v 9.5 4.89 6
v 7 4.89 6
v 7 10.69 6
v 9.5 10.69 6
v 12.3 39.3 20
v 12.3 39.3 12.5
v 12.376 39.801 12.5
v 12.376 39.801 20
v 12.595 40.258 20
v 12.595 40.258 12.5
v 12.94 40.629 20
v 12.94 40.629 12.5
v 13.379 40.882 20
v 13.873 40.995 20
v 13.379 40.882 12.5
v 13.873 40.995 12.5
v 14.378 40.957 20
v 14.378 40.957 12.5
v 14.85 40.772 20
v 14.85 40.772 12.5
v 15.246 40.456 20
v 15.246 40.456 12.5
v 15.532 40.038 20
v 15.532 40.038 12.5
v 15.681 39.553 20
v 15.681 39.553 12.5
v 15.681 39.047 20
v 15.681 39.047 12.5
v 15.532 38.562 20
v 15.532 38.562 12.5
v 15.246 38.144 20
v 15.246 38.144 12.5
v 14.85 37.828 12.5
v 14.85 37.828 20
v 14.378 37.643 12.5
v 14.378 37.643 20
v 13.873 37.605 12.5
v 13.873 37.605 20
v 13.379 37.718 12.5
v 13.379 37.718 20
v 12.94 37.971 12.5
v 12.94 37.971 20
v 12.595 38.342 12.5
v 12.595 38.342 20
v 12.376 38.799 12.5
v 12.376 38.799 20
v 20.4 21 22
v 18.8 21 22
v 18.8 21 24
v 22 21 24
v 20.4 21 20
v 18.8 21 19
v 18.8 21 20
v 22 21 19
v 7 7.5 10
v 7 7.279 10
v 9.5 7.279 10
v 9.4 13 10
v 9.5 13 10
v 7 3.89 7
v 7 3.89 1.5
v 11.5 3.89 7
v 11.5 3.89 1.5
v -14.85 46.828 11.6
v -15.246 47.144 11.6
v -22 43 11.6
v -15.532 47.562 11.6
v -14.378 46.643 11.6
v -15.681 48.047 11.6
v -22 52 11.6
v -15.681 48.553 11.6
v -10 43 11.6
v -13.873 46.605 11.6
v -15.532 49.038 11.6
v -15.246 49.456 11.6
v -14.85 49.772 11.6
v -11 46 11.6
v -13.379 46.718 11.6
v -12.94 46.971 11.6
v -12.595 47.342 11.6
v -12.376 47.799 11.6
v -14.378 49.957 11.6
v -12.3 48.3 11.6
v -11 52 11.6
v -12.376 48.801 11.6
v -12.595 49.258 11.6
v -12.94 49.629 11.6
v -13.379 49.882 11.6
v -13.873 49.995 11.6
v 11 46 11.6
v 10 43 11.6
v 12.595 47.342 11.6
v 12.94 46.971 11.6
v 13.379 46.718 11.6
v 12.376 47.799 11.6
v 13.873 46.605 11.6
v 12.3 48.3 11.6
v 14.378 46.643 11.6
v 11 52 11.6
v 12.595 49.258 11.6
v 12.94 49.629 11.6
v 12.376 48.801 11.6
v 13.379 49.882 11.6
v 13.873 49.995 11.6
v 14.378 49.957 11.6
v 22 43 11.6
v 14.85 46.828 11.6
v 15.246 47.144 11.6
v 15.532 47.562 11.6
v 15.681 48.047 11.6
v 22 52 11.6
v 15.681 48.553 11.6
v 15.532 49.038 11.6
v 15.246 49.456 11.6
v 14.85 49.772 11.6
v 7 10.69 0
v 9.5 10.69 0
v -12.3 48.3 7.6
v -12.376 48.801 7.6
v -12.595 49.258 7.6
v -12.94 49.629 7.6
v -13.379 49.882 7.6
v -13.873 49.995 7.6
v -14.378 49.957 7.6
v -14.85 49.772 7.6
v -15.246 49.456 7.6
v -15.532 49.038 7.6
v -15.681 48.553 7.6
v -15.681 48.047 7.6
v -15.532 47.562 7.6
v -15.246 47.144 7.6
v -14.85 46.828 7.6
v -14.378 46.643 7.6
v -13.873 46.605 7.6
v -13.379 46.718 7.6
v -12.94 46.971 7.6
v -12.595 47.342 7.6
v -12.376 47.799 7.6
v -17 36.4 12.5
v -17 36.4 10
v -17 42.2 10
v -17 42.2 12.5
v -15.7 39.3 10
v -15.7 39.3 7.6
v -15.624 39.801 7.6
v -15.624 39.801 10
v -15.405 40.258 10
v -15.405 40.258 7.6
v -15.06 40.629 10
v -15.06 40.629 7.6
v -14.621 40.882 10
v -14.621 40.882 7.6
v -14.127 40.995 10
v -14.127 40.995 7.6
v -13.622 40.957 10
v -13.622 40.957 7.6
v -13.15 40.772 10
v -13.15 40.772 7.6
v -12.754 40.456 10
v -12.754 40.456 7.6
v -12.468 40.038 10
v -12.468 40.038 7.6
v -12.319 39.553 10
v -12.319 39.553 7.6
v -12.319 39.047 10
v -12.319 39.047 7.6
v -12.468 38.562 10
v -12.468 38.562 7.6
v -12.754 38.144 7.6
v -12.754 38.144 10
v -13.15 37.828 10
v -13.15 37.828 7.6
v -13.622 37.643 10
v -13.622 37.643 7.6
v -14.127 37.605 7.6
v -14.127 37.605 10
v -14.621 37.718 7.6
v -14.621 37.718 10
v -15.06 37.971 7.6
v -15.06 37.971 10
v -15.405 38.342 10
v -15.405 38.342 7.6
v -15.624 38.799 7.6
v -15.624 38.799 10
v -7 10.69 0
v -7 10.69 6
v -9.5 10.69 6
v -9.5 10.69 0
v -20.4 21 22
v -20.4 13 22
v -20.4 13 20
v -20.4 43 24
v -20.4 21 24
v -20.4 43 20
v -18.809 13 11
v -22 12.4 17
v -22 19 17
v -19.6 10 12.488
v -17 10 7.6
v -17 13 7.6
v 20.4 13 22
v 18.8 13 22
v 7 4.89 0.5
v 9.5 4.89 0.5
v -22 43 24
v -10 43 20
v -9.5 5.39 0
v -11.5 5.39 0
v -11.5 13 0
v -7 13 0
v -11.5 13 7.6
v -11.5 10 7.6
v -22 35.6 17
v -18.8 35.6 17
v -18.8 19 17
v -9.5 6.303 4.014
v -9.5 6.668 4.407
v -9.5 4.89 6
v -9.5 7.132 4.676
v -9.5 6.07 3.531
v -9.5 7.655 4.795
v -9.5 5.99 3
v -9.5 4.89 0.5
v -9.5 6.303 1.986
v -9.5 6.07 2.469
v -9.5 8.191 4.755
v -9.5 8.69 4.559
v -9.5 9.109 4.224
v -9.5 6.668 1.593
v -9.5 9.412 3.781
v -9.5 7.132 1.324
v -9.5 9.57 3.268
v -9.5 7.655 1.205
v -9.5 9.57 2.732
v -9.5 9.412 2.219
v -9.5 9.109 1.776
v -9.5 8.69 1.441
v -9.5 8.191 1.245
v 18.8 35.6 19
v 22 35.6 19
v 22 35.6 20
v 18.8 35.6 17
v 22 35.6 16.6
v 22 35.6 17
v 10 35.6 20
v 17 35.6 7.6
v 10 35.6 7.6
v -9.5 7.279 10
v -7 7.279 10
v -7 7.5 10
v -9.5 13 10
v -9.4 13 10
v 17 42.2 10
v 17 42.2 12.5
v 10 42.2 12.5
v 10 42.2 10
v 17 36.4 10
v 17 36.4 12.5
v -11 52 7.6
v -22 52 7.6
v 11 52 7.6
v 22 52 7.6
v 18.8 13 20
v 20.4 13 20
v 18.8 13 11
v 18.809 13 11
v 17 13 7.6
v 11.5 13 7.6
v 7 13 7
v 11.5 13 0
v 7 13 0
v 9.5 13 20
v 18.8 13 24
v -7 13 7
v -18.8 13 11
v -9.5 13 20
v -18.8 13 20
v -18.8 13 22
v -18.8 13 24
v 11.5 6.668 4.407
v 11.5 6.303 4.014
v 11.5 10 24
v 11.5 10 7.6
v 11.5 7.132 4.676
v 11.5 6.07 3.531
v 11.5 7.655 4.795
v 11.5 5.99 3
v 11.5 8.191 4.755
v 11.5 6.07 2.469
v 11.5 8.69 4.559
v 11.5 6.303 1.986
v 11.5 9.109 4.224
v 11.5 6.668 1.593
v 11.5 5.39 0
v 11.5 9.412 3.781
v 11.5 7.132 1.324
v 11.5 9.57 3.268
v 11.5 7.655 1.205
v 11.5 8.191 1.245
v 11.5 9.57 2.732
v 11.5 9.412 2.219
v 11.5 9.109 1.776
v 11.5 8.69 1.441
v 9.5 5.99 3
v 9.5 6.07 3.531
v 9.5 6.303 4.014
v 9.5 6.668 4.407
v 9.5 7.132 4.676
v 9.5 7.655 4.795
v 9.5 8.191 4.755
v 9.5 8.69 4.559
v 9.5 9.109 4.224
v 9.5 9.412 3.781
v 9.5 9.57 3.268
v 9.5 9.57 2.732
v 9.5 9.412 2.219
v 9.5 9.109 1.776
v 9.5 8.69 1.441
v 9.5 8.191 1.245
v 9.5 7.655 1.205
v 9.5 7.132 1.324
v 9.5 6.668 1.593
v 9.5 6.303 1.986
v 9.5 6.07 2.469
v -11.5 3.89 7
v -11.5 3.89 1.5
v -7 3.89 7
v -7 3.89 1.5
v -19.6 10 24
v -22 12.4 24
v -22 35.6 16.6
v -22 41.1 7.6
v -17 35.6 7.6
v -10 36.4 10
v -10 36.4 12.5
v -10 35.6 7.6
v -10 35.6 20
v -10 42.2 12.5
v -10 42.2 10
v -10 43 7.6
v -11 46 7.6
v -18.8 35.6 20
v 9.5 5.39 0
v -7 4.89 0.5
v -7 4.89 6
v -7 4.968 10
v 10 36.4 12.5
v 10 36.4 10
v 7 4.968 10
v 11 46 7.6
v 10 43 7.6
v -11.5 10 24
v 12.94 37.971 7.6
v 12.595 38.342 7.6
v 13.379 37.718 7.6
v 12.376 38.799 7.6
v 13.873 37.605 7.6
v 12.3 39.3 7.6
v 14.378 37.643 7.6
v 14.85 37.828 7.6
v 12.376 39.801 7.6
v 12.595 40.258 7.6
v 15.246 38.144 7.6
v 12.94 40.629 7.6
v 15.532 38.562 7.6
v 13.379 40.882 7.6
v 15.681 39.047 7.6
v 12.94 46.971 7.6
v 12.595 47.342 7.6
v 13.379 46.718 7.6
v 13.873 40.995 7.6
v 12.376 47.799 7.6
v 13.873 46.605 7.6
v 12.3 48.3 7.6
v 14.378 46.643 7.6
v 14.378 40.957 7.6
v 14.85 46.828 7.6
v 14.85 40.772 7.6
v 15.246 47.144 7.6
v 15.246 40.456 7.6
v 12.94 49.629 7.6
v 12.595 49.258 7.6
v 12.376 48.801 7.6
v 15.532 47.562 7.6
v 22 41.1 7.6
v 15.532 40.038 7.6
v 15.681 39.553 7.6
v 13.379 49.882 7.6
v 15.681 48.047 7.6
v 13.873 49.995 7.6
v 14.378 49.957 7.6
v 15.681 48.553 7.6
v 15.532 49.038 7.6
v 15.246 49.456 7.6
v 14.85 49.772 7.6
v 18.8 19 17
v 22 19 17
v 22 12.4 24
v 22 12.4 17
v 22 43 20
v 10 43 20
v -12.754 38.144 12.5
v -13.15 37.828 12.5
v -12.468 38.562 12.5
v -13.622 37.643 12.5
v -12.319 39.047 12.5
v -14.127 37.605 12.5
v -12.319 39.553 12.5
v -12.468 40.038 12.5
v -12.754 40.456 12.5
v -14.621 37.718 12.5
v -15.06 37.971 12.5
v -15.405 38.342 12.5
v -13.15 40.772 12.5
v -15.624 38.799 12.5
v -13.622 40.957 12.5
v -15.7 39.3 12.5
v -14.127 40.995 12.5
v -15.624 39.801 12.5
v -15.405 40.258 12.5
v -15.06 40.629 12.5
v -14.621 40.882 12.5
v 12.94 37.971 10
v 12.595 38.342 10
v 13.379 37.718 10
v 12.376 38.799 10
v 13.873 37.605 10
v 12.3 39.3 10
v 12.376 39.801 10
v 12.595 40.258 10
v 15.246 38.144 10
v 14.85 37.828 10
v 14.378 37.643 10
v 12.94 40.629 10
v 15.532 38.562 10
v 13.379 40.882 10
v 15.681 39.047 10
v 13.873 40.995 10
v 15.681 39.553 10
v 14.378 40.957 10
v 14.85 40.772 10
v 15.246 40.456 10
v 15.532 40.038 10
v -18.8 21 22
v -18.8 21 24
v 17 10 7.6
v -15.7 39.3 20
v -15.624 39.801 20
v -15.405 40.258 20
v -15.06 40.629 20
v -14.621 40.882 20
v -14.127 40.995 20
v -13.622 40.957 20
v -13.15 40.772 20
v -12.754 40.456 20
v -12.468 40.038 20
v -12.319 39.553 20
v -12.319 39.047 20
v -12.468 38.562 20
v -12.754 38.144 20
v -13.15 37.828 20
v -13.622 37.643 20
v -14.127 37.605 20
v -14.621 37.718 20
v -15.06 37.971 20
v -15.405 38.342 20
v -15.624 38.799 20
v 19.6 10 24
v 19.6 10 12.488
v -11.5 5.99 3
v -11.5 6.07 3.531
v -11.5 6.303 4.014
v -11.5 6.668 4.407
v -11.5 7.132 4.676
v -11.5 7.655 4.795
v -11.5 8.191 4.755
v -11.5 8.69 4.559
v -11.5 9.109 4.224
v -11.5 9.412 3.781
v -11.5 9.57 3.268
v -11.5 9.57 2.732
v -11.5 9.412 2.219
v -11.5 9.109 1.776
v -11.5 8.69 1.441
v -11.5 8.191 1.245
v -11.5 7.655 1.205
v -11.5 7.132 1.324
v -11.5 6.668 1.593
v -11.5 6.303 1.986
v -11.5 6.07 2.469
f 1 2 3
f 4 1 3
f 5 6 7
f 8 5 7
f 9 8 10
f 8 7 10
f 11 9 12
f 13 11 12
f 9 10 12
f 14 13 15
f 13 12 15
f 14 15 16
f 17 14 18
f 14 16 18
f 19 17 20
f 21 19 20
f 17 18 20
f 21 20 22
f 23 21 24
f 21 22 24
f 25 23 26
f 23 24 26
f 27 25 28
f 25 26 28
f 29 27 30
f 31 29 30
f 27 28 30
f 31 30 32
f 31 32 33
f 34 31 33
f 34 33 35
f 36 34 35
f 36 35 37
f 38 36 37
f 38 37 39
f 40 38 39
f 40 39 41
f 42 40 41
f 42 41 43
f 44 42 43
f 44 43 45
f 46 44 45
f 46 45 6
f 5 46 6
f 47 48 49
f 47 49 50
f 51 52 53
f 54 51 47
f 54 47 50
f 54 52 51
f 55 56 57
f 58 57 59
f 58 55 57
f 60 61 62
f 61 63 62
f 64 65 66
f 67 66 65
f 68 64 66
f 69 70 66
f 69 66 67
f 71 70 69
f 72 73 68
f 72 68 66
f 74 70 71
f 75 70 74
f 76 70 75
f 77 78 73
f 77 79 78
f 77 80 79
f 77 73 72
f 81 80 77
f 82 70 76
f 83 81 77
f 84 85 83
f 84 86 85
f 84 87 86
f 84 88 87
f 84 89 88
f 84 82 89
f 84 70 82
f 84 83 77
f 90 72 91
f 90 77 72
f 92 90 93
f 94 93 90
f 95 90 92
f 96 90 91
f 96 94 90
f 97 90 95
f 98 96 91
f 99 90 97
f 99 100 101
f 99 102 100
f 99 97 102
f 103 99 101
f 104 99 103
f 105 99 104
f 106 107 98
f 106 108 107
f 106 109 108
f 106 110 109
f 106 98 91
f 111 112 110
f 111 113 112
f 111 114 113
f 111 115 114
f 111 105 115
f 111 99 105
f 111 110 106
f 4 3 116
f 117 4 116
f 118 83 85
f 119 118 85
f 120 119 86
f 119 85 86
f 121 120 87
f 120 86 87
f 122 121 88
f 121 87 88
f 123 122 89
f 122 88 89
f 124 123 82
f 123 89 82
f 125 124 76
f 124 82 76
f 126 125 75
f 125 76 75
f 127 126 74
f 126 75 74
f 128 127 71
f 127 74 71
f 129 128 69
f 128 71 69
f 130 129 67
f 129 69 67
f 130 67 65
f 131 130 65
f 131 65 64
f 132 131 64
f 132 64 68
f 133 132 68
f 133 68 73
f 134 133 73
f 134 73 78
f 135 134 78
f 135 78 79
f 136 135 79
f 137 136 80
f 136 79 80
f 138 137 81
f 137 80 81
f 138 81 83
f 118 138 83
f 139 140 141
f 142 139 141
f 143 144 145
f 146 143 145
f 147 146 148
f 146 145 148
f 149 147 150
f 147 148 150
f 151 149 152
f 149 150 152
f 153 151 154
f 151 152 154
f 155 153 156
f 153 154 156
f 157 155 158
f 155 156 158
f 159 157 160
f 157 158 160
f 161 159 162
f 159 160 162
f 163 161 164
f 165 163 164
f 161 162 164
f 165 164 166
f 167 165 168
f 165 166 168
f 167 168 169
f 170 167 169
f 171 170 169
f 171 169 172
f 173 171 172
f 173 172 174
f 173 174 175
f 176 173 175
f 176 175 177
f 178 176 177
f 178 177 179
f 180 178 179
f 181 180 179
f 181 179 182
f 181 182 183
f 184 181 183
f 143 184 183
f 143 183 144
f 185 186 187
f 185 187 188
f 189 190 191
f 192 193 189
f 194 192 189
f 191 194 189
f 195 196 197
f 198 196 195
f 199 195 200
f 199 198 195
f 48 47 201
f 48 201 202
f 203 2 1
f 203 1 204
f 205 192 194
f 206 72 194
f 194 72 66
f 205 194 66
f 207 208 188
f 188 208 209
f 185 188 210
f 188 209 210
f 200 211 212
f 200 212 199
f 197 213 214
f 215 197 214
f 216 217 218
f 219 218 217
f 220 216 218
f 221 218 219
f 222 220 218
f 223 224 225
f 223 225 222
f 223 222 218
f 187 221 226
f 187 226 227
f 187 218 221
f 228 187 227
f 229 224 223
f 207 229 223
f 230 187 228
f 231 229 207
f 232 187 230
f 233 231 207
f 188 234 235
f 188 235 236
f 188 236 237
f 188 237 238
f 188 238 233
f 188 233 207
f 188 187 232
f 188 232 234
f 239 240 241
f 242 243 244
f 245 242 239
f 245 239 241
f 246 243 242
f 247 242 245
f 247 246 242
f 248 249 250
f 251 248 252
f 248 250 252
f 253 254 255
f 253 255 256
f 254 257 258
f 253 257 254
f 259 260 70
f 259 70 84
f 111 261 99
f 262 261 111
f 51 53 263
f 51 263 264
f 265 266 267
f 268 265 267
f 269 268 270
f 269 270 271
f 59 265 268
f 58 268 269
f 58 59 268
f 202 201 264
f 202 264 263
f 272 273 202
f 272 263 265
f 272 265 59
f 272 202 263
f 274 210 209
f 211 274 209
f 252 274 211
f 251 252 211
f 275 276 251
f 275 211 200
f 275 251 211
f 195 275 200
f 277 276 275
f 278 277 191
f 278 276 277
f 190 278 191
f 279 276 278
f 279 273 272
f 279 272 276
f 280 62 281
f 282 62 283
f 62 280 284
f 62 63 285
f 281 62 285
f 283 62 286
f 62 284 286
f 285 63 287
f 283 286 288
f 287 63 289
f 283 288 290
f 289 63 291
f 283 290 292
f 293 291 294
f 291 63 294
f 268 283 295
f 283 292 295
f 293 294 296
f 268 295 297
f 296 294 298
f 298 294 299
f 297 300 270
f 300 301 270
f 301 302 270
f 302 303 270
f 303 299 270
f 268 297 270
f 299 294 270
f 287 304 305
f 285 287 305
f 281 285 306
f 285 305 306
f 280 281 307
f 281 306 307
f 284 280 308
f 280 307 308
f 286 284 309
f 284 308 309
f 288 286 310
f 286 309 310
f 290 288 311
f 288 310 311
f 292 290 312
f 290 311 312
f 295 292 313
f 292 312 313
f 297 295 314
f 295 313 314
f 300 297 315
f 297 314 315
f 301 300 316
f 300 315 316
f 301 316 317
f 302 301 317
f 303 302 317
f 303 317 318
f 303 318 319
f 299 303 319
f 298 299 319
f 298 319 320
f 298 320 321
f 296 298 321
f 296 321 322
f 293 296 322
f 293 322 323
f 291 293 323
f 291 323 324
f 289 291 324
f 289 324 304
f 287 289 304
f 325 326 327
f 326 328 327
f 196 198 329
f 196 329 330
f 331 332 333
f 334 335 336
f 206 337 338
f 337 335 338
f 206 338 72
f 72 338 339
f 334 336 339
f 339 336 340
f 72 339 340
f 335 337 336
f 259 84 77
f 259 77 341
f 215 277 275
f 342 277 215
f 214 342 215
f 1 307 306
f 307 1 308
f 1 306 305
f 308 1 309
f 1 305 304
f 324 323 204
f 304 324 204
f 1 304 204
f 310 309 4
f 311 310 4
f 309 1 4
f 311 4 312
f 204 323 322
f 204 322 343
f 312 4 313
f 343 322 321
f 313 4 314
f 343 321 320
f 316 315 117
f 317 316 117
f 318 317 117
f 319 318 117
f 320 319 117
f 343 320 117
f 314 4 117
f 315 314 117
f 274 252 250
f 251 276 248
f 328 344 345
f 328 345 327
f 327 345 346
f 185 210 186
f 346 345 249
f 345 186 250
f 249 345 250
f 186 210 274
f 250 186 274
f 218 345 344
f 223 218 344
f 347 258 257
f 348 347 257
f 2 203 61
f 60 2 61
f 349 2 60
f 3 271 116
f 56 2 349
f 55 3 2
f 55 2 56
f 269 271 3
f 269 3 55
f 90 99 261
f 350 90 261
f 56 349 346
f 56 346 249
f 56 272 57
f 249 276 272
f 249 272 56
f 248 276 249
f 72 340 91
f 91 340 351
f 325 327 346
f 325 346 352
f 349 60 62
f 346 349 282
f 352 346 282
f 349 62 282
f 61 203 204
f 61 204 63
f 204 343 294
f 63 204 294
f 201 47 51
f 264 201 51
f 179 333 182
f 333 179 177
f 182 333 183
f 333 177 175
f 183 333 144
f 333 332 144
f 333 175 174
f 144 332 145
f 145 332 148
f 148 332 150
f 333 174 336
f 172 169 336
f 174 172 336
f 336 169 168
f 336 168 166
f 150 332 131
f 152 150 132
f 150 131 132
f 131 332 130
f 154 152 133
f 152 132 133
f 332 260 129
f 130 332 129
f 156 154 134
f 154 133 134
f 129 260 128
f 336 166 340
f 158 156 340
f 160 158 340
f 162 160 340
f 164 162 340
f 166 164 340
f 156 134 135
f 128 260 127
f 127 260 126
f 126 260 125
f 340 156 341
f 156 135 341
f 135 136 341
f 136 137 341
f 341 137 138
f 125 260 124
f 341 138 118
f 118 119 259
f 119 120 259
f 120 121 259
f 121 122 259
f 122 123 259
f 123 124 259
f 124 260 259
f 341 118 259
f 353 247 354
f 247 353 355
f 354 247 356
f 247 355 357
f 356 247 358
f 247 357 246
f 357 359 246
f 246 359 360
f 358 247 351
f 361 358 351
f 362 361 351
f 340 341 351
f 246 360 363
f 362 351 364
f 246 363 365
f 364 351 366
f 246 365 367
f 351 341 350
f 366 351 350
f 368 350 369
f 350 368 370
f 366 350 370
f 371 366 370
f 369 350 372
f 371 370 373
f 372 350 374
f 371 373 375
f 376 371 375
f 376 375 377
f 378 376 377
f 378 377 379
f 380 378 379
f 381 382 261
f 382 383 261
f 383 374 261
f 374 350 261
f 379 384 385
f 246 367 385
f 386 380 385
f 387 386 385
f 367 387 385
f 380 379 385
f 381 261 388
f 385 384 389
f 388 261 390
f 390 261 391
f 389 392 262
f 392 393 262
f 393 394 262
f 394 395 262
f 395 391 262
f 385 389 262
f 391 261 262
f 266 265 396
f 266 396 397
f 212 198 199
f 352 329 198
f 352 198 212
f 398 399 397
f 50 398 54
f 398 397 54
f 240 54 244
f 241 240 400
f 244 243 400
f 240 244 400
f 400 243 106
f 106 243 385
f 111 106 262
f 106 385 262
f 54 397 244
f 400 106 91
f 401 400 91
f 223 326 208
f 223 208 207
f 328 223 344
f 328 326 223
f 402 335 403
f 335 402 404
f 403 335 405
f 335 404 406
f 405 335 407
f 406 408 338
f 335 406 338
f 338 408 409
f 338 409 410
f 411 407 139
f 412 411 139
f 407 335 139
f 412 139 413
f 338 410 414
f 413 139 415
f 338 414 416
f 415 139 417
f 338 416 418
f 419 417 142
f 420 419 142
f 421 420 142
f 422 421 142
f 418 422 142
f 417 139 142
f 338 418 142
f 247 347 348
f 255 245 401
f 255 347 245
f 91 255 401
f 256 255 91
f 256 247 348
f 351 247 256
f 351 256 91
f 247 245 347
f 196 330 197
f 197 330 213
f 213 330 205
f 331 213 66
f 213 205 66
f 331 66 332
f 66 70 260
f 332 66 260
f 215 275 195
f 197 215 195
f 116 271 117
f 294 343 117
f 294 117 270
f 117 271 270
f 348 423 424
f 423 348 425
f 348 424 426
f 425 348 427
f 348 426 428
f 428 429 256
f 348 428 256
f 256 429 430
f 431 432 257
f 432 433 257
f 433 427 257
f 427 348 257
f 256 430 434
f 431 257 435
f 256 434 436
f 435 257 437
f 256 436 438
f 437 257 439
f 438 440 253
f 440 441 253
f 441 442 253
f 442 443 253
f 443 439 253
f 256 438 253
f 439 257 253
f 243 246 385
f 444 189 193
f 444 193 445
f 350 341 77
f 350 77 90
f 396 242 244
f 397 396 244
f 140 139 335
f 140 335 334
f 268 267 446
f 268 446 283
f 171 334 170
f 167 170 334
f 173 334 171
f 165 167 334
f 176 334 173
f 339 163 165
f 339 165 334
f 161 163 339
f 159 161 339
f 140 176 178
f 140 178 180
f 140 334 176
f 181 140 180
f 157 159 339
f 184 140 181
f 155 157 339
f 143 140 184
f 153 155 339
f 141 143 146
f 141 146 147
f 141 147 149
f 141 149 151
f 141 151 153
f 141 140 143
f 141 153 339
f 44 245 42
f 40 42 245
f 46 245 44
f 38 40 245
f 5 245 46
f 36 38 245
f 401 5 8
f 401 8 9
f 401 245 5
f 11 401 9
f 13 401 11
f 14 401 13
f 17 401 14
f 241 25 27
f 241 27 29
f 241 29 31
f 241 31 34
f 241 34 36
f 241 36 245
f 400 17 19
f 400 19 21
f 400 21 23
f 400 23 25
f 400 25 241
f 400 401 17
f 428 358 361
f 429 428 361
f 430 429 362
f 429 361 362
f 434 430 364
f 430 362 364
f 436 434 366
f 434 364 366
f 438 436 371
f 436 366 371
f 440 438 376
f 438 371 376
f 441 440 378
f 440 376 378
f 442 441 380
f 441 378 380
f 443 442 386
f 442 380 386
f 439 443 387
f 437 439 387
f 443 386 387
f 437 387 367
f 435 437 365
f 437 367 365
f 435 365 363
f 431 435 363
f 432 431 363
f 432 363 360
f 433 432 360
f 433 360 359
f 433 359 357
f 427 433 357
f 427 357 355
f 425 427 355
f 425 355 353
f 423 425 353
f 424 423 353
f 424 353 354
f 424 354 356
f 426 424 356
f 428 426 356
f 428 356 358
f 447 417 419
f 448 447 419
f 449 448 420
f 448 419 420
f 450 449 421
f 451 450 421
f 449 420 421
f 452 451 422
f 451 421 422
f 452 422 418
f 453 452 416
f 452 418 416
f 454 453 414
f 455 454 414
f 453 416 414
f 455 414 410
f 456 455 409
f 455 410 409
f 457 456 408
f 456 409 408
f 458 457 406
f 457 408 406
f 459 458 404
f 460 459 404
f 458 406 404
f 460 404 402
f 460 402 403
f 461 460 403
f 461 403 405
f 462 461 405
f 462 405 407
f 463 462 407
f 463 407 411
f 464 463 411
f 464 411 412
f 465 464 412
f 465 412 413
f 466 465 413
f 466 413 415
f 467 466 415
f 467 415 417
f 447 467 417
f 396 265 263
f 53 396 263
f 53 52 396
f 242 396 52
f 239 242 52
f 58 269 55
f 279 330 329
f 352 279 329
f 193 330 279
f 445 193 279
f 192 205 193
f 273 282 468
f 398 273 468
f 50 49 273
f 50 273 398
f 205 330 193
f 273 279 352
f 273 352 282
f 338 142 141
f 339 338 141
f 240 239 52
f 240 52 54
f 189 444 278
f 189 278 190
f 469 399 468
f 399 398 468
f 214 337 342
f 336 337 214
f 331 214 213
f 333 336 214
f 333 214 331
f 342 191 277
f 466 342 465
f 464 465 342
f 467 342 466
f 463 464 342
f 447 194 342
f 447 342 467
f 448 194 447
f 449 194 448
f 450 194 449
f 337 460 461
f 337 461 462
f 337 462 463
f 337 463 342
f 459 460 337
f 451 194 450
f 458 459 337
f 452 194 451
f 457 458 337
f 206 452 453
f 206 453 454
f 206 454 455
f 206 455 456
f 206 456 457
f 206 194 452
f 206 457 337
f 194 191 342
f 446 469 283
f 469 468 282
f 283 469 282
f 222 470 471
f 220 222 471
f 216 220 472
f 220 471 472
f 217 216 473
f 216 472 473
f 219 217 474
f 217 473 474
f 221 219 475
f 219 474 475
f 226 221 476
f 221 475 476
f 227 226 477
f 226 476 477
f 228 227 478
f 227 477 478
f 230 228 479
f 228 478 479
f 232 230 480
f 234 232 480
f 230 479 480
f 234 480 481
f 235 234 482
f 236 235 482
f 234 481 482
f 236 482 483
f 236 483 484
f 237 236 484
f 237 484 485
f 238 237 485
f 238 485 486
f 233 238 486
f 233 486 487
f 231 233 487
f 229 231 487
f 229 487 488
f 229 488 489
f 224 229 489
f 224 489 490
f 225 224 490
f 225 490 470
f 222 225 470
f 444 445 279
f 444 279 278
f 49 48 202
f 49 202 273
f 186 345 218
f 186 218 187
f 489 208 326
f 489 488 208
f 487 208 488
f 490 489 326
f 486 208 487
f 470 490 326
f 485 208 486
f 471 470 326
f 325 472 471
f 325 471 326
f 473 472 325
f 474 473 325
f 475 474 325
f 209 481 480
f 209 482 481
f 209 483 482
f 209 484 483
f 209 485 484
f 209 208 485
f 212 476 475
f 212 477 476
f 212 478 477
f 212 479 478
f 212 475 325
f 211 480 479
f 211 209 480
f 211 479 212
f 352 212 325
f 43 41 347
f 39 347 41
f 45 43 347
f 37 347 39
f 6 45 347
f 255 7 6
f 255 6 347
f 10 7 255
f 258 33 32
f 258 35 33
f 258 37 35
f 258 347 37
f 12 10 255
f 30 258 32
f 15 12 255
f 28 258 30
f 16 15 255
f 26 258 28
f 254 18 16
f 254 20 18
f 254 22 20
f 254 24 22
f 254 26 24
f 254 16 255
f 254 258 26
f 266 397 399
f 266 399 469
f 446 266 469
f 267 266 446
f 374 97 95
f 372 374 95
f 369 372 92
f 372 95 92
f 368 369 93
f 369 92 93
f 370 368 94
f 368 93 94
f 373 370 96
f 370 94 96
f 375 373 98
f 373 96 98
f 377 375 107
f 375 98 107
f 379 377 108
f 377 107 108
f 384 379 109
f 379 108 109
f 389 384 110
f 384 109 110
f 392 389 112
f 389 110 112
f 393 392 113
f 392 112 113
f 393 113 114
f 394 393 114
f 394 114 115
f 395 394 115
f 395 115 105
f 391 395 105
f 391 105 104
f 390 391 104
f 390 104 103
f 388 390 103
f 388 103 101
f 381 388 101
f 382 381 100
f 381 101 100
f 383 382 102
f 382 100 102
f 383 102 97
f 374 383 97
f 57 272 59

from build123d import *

# Parameters (mm, degrees)
SKETCH_1_W                = 44
SKETCH_1_H                = 34
EXTRUDE_1_DEPTH           = 24
CUT_EXTRUDE_1_DEPTH       = 31
SKETCH_5_W                = 23
SKETCH_5_H                = 6.11
EXTRUDE_4_DEPTH           = 1
EXTRUDE_5_DEPTH           = 23
SKETCH_7_R                = 1.8
CUT_EXTRUDE_2_DEPTH       = 23
CUT_EXTRUDE_4_DEPTH       = 14
SKETCH_11_R               = 1.7
EXTRUDE_6_DEPTH           = 20
CUT_EXTRUDE_7_DEPTH       = 4
CHAMFER_3_SIZE            = 2.4
SKETCH_14_W               = 40.8
SKETCH_14_H               = 4
CUT_EXTRUDE_8_DEPTH       = 23
SKETCH_15_W               = 44
SKETCH_15_H               = 1
CUT_EXTRUDE_9_DEPTH       = 24
SKETCH_16_W               = 3.2
SKETCH_16_H               = 14.6
CUT_EXTRUDE_10_DEPTH      = 5
CUT_EXTRUDE_12_DEPTH      = 10
CUT_EXTRUDE_12_DEPTH_BACK = 17
SKETCH_19_W               = 1
SKETCH_19_H               = 6.11
CUT_EXTRUDE_13_DEPTH      = 23
CHAMFER_4_SIZE            = 1.5
SKETCH_22_W               = 34
SKETCH_22_H               = 7.4
SKETCH_22_W_2             = 5.5
SKETCH_22_H_2             = 3
CUT_EXTRUDE_14_DEPTH      = 7.6
SKETCH_23_W               = 6
SKETCH_23_H               = 5.8
CUT_EXTRUDE_15_DEPTH      = 2.5
SKETCH_25_W               = 2.5
SKETCH_25_H               = 5.8
CUT_EXTRUDE_17_DEPTH      = 7
SKETCH_26_W               = 34
SKETCH_26_H               = 4
EXTRUDE_7_DEPTH           = 9
SKETCH_27_W               = 22
SKETCH_27_H               = 4.9
CUT_EXTRUDE_18_DEPTH      = 6
SKETCH_28_R               = 1.7
CUT_EXTRUDE_19_DEPTH      = 4
CHAMFER_5_SIZE            = 5
CHAMFER_5_SIZE_2          = 9.4
CHAMFER_6_SIZE            = 5
CHAMFER_6_SIZE_2          = 9.4
SKETCH_30_W               = 5
SKETCH_30_H               = 7.4
EXTRUDE_8_DEPTH           = 9.4
SKETCH_32_W               = 5
SKETCH_32_H               = 4
EXTRUDE_9_DEPTH           = 9
SKETCH_33_W               = 1.6
SKETCH_33_H               = 4
CUT_EXTRUDE_20_DEPTH      = 7.4
CHAMFER_START             = 3.158134344
CHAMFER_7_DEPTH           = 2.841865656
CHAMFER_START_2           = -6
CHAMFER_8_DEPTH           = 2.841865656
CHAMFER_START_3           = 9
CHAMFER_9_DEPTH           = 4.404008624
CHAMFER_START_4           = -13.404008624
CHAMFER_10_DEPTH          = 14.281940081
CHAMFER_11_SIZE           = 6
CHAMFER_12_SIZE           = 6


with BuildPart() as part:
    # Эскиз1 → Бобышка-Вытянуть1 (new body)
    with BuildSketch(Plane.XY):
        with Locations((0, 27)):
            Rectangle(SKETCH_1_W, SKETCH_1_H)
    extrude(amount=EXTRUDE_1_DEPTH)

    # Эскиз2 → Вырез-Вытянуть1 (cut)
    with BuildSketch(Plane(origin=(0, 44, 0), x_dir=(1, 0, 0), z_dir=(0, 1, 0))):
        Polygon((-18.8, 0), (18.8, 0), (18.8, -20), (20.4, -20), (20.4, -22), (18.8, -22), (18.8, -24), (-18.8, -24), (-18.8, -22), (-20.4, -22), (-20.4, -20), (-18.8, -20), align=None)
    extrude(amount=-CUT_EXTRUDE_1_DEPTH, mode=Mode.SUBTRACT)



with BuildPart() as body_2:
    # Эскиз5 → Бобышка-Вытянуть4 (new body)
    with BuildSketch(Plane(origin=(0, 0, 0), x_dir=(-1, 0, 0), z_dir=(0, 0, -1))):
        with Locations((0, 6.945)):
            Rectangle(SKETCH_5_W, SKETCH_5_H)
    extrude(amount=EXTRUDE_4_DEPTH)


with BuildPart() as part_1:
    add(part.part)

    add(body_2.part)  # Бобышка-Вытянуть5 merges body 2
    # Эскиз6 → Бобышка-Вытянуть5 (add)
    with BuildSketch(Plane(origin=(11.5, 0, 0), x_dir=(0, 0, -1), z_dir=(1, 0, 0))):
        Polygon((0, 3.89), (-7, 3.89), (-24, 10), (0, 10), align=None)
    extrude(amount=-EXTRUDE_5_DEPTH)

    # Эскиз7 → Вырез-Вытянуть2 (cut)
    with BuildSketch(Plane.ZY.offset(11.5)):
        with Locations(Location((3, 7.79, 0), (0, 0, 270))):
            Circle(SKETCH_7_R)
    extrude(amount=-CUT_EXTRUDE_2_DEPTH, mode=Mode.SUBTRACT)

    # Эскиз8 → Вырез-Вытянуть4 (cut)
    with BuildSketch(Plane.ZY.offset(7)):
        Polygon((20, 13), (-1, 13), (-1, 3.89), (10, 3.89), (10, 7.278569391), align=None)
    extrude(amount=-CUT_EXTRUDE_4_DEPTH, mode=Mode.SUBTRACT)

    # Эскиз11 → Бобышка-Вытянуть6 (add)
    # profile 1 of 2: a face of its own
    with BuildSketch(Plane(origin=(0, 0, 0), x_dir=(-1, 0, 0), z_dir=(0, 0, -1))):
        Polygon((-14, 43), (-18.8, 43), (-18.8, 35.6), (-14, 35.6), (-10, 35.6), (-10, 43), align=None)
        with Locations((-14, 39.3)):
            Circle(SKETCH_11_R, mode=Mode.SUBTRACT)
    # profile 2 of 2: a face of its own
    with BuildSketch(Plane(origin=(0, 0, 0), x_dir=(-1, 0, 0), z_dir=(0, 0, -1))):
        Polygon((18.8, 35.6), (14, 35.6), (10, 35.6), (10, 43), (14, 43), (18.8, 43), align=None)
        with Locations((14, 39.3)):
            Circle(SKETCH_11_R, mode=Mode.SUBTRACT)
    extrude(amount=-EXTRUDE_6_DEPTH)

    # Эскиз13 → Вырез-Вытянуть7 (cut)
    with BuildSketch(Plane.ZY.offset(22)):
        Polygon((9, 34), (17, 36), (17, 33.5), (9, 31.5), align=None)
        Polygon((9, 30.5), (17, 32.5), (17, 30), (9, 28), align=None)
        Polygon((9, 27), (17, 29), (17, 26.5), (9, 24.5), align=None)
        Polygon((9, 23.5), (17, 25.5), (17, 23), (9, 21), align=None)
        Polygon((9, 20), (17, 22), (17, 19.5), (9, 17.5), align=None)
    cut_extrude_7 = extrude(amount=-CUT_EXTRUDE_7_DEPTH, mode=Mode.SUBTRACT)

    # Зеркальное отражение1: Вырез-Вытянуть7 across plane
    add(cut_extrude_7.mirror(Plane(origin=(0, 0, 0), x_dir=(0, 0, 1), z_dir=(1, 0, 0))), mode=Mode.SUBTRACT)

    # Фаска3
    chamfer_3_edges = [part_1.edges().sort_by_distance(p)[0] for p in [
        (22, 10, 12),
        (-22, 10, 12),
    ]]
    chamfer(chamfer_3_edges, length=CHAMFER_3_SIZE)

    # Эскиз14 → Вырез-Вытянуть8 (cut)
    with BuildSketch(Plane(origin=(0, 44, 0), x_dir=(1, 0, 0), z_dir=(0, 1, 0))):
        with Locations((0, -22)):
            Rectangle(SKETCH_14_W, SKETCH_14_H)
    extrude(amount=-CUT_EXTRUDE_8_DEPTH, mode=Mode.SUBTRACT)

    # Эскиз15 → Вырез-Вытянуть9 (cut)
    with BuildSketch(Plane(origin=(0, 0, 0), x_dir=(-1, 0, 0), z_dir=(0, 0, -1))):
        with Locations((0, 43.5)):
            Rectangle(SKETCH_15_W, SKETCH_15_H)
    extrude(amount=-CUT_EXTRUDE_9_DEPTH, mode=Mode.SUBTRACT)

    # Эскиз16 → Вырез-Вытянуть10 (cut)
    with BuildSketch(Plane.XY.offset(24)):
        with Locations((20.4, 28.3)):
            Rectangle(SKETCH_16_W, SKETCH_16_H)
    extrude(amount=-CUT_EXTRUDE_10_DEPTH, mode=Mode.SUBTRACT)

    # Эскиз18 → Вырез-Вытянуть12 (cut, two sides: drawn at the far end of the back side and taken through both)
    with BuildSketch(Plane(origin=(0, 0, 0), x_dir=(-1, 0, 0), z_dir=(0, 0, -1)).offset(-CUT_EXTRUDE_12_DEPTH_BACK)):
        Polygon((-22, 43), (-17, 43), (-17, 10), (-19.6, 10), (-22, 12.4), align=None)
        Polygon((22, 12.4), (19.6, 10), (17, 10), (17, 43), (22, 43), align=None)
    extrude(amount=CUT_EXTRUDE_12_DEPTH + CUT_EXTRUDE_12_DEPTH_BACK, mode=Mode.SUBTRACT)

    # Эскиз19 → Вырез-Вытянуть13 (cut)
    with BuildSketch(Plane.ZY.offset(11.5)):
        with Locations((-0.5, 6.945)):
            Rectangle(SKETCH_19_W, SKETCH_19_H)
    extrude(amount=-CUT_EXTRUDE_13_DEPTH, mode=Mode.SUBTRACT)

    # Фаска4
    chamfer_4_edges = [part_1.edges().sort_by_distance(p)[0] for p in [
        (-9.25, 3.89, 0),
        (9.25, 3.89, 0),
    ]]
    chamfer(chamfer_4_edges, length=CHAMFER_4_SIZE)

    # Эскиз22 → Вырез-Вытянуть14 (cut)
    with BuildSketch(Plane(origin=(0, 0, 0), x_dir=(-1, 0, 0), z_dir=(0, 0, -1))):
        with Locations((0, 39.3)):
            Rectangle(SKETCH_22_W, SKETCH_22_H)
        with Locations((-14.25, 11.5)):
            Rectangle(SKETCH_22_W_2, SKETCH_22_H_2)
        with Locations((14.25, 11.5)):
            Rectangle(SKETCH_22_W_2, SKETCH_22_H_2)
    extrude(amount=-CUT_EXTRUDE_14_DEPTH, mode=Mode.SUBTRACT)

    # Эскиз23 → Вырез-Вытянуть15 (cut)
    with BuildSketch(Plane(origin=(-7, 0, 0), x_dir=(0, 0, -1), z_dir=(1, 0, 0))):
        with Locations((-3, 7.79)):
            Rectangle(SKETCH_23_W, SKETCH_23_H)
        Polygon((-20, 13), (-10, 7.278569391), (-10, 13), align=None)
    cut_extrude_15 = extrude(amount=-CUT_EXTRUDE_15_DEPTH, mode=Mode.SUBTRACT)

    # Зеркальное отражение2: Вырез-Вытянуть15 across plane
    add(cut_extrude_15.mirror(Plane(origin=(0, 0, 0), x_dir=(0, 0, 1), z_dir=(1, 0, 0))), mode=Mode.SUBTRACT)

    # Эскиз25 → Вырез-Вытянуть17 (cut)
    with BuildSketch(Plane(origin=(17, 0, 0), x_dir=(0, 0, -1), z_dir=(1, 0, 0))):
        with Locations((-11.25, 39.3)):
            Rectangle(SKETCH_25_W, SKETCH_25_H)
    cut_extrude_17 = extrude(amount=-CUT_EXTRUDE_17_DEPTH, mode=Mode.SUBTRACT)

    # Зеркальное отражение3: Вырез-Вытянуть17 across plane
    add(cut_extrude_17.mirror(Plane(origin=(0, 0, 0), x_dir=(0, 0, 1), z_dir=(1, 0, 0))), mode=Mode.SUBTRACT)

    # Эскиз26 → Бобышка-Вытянуть7 (add)
    with BuildSketch(Plane(origin=(0, 43, 0), x_dir=(1, 0, 0), z_dir=(0, 1, 0))):
        with Locations((0, -9.6)):
            Rectangle(SKETCH_26_W, SKETCH_26_H)
    extrude(amount=EXTRUDE_7_DEPTH)

    # Эскиз27 → Вырез-Вытянуть18 (cut)
    with BuildSketch(Plane(origin=(0, 52, 0), x_dir=(1, 0, 0), z_dir=(0, 1, 0))):
        with Locations((0, -10.05)):
            Rectangle(SKETCH_27_W, SKETCH_27_H)
    extrude(amount=-CUT_EXTRUDE_18_DEPTH, mode=Mode.SUBTRACT)

    # Эскиз28 → Вырез-Вытянуть19 (cut)
    with BuildSketch(Plane.XY.offset(11.6)):
        with Locations((-14, 48.3)):
            Circle(SKETCH_28_R)
        with Locations(Location((14, 48.3, 0), (0, 0, 180))):
            Circle(SKETCH_28_R)
    extrude(amount=-CUT_EXTRUDE_19_DEPTH, mode=Mode.SUBTRACT)

    # Фаска5
    # the kernel refuses this chamfer: 9.4, 5 mm, written as the material it adds along each edge
    with BuildSketch(Plane(origin=(-17, 10, 17), x_dir=(-1, 0, 0), z_dir=(0, 1, 0))) as chamfer_5_piece_1_section:
        Polygon((CHAMFER_5_SIZE, 0), (0, -CHAMFER_5_SIZE_2), (0, 0), align=None)
    chamfer_5_piece_1 = extrude(amount=3, mode=Mode.PRIVATE)
    chamfer_5_piece_1 = split(chamfer_5_piece_1, bisect_by=Plane(origin=(-18.3, 8.7, 17), z_dir=(0.7071067811865478, 0.7071067811865474, 0)), keep=Keep.TOP, mode=Mode.PRIVATE)
    add(chamfer_5_piece_1)

    # Фаска6
    # the kernel refuses this chamfer: 9.4, 5 mm, written as the material it adds along each edge
    with BuildSketch(Plane(origin=(17, 13, 17), x_dir=(1, 0, 0), z_dir=(0, -1, 0))) as chamfer_6_piece_1_section:
        Polygon((CHAMFER_6_SIZE, 0), (0, -CHAMFER_6_SIZE_2), (0, 0), align=None)
    chamfer_6_piece_1 = extrude(amount=3, mode=Mode.PRIVATE)
    chamfer_6_piece_1 = split(chamfer_6_piece_1, bisect_by=Plane(origin=(19.8, 10.2, 17), z_dir=(-0.7071067811865478, 0.7071067811865474, 0)), keep=Keep.TOP, mode=Mode.PRIVATE)
    add(chamfer_6_piece_1)

    # Эскиз30 → Бобышка-Вытянуть8 (add)
    with BuildSketch(Plane(origin=(0, 0, 7.6), x_dir=(-1, 0, 0), z_dir=(0, 0, -1))):
        with Locations((-19.5, 39.3)):
            Rectangle(SKETCH_30_W, SKETCH_30_H)
        with Locations((19.5, 39.3)):
            Rectangle(SKETCH_30_W, SKETCH_30_H)
    extrude(amount=-EXTRUDE_8_DEPTH)

    # Эскиз32 → Бобышка-Вытянуть9 (add)
    with BuildSketch(Plane(origin=(0, 52, 0), x_dir=(1, 0, 0), z_dir=(0, 1, 0))):
        with Locations((-19.5, -9.6)):
            Rectangle(SKETCH_32_W, SKETCH_32_H)
        with Locations((19.5, -9.6)):
            Rectangle(SKETCH_32_W, SKETCH_32_H)
    extrude(amount=-EXTRUDE_9_DEPTH)

    # Эскиз33 → Вырез-Вытянуть20 (cut)
    with BuildSketch(Plane(origin=(0, 43, 0), x_dir=(1, 0, 0), z_dir=(0, 1, 0))):
        with Locations((21.2, -22)):
            Rectangle(SKETCH_33_W, SKETCH_33_H)
    extrude(amount=-CUT_EXTRUDE_20_DEPTH, mode=Mode.SUBTRACT)

    # Фаска7: read off the stored shape, not the designer's step
    # Фаска7 outline → Фаска7 (cut)
    with BuildSketch(Plane(origin=(0, 0, 0), x_dir=(0.6735542111960274, -0.35393772244377236, -0.648885824480249), z_dir=(0.7391378251585405, 0.3225328691600908, 0.5913102601268327)).offset(CHAMFER_START)):
        Polygon((-13.858270642, 1.79569549), (-13.858270642, 8.060677533), (-17.421458222, 6.624121141), align=None)
    extrude(amount=CHAMFER_7_DEPTH, mode=Mode.SUBTRACT)

    # Фаска8: read off the stored shape, not the designer's step
    # Фаска8 outline → Фаска8 (cut)
    with BuildSketch(Plane(origin=(0, 0, 0), x_dir=(0.6735542111960274, 0.35393772244377236, 0.648885824480249), z_dir=(0.7391378251585405, -0.3225328691600908, -0.5913102601268327)).offset(CHAMFER_START_2)):
        Polygon((17.421458222, -6.624121141), (13.858270642, -1.79569549), (13.858270642, -8.060677533), align=None)
    extrude(amount=CHAMFER_8_DEPTH, mode=Mode.SUBTRACT)

    # Фаска9: read off the stored shape, not the designer's step
    # Фаска9 outline → Фаска9 (cut)
    with BuildSketch(Plane(origin=(0, 0, 0), x_dir=(0.7291332431365165, -0.583961995177201, -0.35686566371940037), z_dir=(0.6843717657481387, 0.6221561506801269, 0.3802065365267439)).offset(CHAMFER_START_3)):
        Polygon((-42.753948395, 4.399141898), (-35.896491206, 12.078678401), (-42.753948395, 14.946653453), align=None)
    extrude(amount=CHAMFER_9_DEPTH, mode=Mode.SUBTRACT)

    # Фаска10: read off the stored shape, not the designer's step
    # Фаска10 outline → Фаска10 (cut)
    with BuildSketch(Plane(origin=(0, 0, 0), x_dir=(0.7291332431365165, 0.583961995177201, 0.35686566371940037), z_dir=(0.6843717657481387, -0.6221561506801269, -0.3802065365267439)).offset(CHAMFER_START_4)):
        Polygon((42.753948395, -4.399141898), (35.896491206, -12.078678401), (42.753948395, -14.946653453), align=None)
    extrude(amount=CHAMFER_10_DEPTH, mode=Mode.SUBTRACT)

    # Фаска11
    chamfer_11_edges = [part_1.edges().sort_by_distance(p)[0] for p in [
        (-20.4, 13, 17),
    ]]
    chamfer(chamfer_11_edges, length=CHAMFER_11_SIZE)

    # Фаска12
    chamfer_12_edges = [part_1.edges().sort_by_distance(p)[0] for p in [
        (20.4, 13, 17),
    ]]
    chamfer(chamfer_12_edges, length=CHAMFER_12_SIZE)


solid = part_1.part
